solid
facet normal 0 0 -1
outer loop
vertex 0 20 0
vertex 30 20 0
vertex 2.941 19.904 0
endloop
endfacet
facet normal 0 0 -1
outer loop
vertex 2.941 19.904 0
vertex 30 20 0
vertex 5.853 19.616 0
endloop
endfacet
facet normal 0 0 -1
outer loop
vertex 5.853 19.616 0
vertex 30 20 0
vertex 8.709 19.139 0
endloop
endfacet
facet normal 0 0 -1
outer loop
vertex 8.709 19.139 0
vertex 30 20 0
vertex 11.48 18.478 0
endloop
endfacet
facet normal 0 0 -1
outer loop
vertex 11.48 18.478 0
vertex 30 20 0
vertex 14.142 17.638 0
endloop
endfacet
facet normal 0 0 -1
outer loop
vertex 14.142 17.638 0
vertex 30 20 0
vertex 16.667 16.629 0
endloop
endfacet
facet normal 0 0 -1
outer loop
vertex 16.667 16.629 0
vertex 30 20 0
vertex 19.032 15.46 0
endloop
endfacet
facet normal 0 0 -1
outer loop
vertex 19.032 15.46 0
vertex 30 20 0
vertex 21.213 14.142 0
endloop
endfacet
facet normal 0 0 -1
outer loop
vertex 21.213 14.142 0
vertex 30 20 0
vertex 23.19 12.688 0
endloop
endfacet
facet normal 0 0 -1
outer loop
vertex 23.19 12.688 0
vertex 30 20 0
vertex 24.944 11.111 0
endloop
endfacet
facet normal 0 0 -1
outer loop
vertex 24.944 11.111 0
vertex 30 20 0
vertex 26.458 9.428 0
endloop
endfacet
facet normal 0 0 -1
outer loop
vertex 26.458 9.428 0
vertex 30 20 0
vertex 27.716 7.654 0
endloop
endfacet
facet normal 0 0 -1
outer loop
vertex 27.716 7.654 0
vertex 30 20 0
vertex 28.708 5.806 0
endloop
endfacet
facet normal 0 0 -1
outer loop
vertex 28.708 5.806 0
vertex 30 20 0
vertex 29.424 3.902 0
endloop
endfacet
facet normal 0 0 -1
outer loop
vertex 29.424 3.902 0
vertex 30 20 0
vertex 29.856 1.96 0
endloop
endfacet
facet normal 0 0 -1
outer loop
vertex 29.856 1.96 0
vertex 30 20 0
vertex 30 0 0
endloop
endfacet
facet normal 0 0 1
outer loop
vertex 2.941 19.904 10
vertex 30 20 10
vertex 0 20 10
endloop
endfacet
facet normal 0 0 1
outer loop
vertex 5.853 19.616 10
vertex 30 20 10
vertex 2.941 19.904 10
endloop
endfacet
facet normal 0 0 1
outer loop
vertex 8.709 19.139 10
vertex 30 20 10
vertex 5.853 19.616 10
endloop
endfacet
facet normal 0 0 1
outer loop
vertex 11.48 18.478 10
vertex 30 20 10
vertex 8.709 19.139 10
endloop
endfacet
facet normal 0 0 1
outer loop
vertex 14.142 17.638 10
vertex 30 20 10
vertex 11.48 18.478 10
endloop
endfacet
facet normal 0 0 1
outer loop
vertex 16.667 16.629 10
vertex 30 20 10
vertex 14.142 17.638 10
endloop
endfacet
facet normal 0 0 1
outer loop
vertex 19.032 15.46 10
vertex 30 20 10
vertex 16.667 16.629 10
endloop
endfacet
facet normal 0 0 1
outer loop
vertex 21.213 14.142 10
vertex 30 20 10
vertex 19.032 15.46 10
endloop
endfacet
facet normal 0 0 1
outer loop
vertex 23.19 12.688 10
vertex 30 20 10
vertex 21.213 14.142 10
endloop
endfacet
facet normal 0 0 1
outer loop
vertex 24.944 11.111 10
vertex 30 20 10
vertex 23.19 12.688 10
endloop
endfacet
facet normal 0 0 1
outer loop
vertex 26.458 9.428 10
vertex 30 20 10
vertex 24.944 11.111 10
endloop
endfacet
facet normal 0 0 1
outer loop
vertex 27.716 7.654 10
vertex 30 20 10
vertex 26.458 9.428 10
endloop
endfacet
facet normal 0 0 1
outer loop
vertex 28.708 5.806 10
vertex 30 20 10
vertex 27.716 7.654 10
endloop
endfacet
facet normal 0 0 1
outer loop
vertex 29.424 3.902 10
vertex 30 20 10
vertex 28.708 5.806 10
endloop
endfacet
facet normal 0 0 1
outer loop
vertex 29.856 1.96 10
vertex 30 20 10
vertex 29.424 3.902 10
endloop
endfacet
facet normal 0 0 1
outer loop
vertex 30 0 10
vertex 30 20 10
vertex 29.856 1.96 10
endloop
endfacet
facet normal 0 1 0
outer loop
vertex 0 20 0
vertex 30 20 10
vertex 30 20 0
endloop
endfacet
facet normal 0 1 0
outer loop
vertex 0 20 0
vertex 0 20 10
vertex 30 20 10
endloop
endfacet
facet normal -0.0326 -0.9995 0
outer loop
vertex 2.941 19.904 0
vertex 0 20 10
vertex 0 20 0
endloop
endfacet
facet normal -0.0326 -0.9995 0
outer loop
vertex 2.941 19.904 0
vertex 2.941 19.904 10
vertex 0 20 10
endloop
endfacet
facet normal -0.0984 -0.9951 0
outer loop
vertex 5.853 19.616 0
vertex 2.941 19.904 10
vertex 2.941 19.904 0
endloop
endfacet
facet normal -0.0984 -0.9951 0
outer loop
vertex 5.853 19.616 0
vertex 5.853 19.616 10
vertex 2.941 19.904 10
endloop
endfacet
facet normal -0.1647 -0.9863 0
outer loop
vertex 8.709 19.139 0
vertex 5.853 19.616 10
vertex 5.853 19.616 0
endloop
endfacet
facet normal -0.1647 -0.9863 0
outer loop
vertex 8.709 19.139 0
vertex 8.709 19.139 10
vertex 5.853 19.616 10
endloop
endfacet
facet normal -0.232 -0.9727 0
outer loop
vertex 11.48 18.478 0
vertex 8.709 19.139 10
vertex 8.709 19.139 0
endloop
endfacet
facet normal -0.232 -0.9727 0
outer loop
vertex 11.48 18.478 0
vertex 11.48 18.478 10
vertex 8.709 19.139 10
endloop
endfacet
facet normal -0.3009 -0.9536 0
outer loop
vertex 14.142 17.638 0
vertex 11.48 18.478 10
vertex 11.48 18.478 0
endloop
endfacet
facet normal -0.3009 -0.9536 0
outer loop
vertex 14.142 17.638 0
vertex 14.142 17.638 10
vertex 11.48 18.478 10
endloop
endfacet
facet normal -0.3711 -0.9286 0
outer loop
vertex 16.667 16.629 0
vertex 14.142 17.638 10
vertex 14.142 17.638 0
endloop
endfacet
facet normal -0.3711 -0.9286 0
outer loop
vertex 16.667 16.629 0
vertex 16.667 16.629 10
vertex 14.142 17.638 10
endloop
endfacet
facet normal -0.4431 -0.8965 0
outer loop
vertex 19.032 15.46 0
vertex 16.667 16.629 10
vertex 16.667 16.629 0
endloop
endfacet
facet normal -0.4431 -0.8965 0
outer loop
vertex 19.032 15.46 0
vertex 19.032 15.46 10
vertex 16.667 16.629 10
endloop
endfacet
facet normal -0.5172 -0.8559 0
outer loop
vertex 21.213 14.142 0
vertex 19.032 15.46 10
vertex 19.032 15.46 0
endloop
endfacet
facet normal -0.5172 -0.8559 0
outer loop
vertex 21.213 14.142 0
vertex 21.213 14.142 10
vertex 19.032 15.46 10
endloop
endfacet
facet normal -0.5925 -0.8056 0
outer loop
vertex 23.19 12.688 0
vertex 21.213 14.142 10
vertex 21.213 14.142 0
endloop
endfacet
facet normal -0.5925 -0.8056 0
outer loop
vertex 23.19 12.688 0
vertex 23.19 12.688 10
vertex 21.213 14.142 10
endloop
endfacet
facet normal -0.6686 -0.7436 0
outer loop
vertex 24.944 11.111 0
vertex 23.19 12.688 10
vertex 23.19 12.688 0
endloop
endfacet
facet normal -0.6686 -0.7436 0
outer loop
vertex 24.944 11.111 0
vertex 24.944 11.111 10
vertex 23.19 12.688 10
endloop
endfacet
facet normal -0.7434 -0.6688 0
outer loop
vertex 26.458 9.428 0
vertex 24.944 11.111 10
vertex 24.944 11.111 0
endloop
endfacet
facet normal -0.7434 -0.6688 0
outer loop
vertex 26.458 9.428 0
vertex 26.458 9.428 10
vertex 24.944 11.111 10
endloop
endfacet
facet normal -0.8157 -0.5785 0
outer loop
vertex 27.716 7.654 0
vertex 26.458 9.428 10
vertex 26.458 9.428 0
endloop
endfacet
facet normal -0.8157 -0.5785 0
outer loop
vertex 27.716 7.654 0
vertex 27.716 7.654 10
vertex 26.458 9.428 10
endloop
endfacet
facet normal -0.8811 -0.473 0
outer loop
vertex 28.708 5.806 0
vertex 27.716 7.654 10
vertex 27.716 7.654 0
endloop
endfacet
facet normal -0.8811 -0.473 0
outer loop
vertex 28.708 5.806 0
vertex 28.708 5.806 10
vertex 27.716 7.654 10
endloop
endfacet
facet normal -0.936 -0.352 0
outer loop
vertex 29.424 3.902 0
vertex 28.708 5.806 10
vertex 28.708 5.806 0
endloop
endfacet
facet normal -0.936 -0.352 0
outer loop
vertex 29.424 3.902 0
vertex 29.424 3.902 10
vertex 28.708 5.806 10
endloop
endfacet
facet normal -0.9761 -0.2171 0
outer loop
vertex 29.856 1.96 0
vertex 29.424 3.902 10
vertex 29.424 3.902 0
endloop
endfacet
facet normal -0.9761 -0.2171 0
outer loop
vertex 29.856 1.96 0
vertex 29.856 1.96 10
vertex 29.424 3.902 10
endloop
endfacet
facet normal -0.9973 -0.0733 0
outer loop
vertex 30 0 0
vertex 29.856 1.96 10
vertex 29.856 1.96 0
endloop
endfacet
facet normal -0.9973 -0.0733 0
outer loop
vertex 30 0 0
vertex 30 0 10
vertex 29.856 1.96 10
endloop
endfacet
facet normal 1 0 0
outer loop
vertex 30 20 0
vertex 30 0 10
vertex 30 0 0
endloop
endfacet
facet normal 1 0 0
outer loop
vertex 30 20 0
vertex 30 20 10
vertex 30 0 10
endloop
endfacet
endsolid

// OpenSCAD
module internal_corner_fillet(dim_x, dim_y, fillet_fn = 64) {
  difference() {
    translate([dim_x / 2, dim_y / 2, 0])
      square([dim_x, dim_y], center=true);
    color("red")
      resize([dim_x * 2, dim_y * 2]) circle(d=1, $fn=fillet_fn);
  }
}

dim_x_ex = 30;
dim_y_ex = 20;

fillet_fn_ex = 64;

// Example Usage
linear_extrude(10)
  internal_corner_fillet(dim_x_ex, dim_y_ex, fillet_fn=fillet_fn_ex);
